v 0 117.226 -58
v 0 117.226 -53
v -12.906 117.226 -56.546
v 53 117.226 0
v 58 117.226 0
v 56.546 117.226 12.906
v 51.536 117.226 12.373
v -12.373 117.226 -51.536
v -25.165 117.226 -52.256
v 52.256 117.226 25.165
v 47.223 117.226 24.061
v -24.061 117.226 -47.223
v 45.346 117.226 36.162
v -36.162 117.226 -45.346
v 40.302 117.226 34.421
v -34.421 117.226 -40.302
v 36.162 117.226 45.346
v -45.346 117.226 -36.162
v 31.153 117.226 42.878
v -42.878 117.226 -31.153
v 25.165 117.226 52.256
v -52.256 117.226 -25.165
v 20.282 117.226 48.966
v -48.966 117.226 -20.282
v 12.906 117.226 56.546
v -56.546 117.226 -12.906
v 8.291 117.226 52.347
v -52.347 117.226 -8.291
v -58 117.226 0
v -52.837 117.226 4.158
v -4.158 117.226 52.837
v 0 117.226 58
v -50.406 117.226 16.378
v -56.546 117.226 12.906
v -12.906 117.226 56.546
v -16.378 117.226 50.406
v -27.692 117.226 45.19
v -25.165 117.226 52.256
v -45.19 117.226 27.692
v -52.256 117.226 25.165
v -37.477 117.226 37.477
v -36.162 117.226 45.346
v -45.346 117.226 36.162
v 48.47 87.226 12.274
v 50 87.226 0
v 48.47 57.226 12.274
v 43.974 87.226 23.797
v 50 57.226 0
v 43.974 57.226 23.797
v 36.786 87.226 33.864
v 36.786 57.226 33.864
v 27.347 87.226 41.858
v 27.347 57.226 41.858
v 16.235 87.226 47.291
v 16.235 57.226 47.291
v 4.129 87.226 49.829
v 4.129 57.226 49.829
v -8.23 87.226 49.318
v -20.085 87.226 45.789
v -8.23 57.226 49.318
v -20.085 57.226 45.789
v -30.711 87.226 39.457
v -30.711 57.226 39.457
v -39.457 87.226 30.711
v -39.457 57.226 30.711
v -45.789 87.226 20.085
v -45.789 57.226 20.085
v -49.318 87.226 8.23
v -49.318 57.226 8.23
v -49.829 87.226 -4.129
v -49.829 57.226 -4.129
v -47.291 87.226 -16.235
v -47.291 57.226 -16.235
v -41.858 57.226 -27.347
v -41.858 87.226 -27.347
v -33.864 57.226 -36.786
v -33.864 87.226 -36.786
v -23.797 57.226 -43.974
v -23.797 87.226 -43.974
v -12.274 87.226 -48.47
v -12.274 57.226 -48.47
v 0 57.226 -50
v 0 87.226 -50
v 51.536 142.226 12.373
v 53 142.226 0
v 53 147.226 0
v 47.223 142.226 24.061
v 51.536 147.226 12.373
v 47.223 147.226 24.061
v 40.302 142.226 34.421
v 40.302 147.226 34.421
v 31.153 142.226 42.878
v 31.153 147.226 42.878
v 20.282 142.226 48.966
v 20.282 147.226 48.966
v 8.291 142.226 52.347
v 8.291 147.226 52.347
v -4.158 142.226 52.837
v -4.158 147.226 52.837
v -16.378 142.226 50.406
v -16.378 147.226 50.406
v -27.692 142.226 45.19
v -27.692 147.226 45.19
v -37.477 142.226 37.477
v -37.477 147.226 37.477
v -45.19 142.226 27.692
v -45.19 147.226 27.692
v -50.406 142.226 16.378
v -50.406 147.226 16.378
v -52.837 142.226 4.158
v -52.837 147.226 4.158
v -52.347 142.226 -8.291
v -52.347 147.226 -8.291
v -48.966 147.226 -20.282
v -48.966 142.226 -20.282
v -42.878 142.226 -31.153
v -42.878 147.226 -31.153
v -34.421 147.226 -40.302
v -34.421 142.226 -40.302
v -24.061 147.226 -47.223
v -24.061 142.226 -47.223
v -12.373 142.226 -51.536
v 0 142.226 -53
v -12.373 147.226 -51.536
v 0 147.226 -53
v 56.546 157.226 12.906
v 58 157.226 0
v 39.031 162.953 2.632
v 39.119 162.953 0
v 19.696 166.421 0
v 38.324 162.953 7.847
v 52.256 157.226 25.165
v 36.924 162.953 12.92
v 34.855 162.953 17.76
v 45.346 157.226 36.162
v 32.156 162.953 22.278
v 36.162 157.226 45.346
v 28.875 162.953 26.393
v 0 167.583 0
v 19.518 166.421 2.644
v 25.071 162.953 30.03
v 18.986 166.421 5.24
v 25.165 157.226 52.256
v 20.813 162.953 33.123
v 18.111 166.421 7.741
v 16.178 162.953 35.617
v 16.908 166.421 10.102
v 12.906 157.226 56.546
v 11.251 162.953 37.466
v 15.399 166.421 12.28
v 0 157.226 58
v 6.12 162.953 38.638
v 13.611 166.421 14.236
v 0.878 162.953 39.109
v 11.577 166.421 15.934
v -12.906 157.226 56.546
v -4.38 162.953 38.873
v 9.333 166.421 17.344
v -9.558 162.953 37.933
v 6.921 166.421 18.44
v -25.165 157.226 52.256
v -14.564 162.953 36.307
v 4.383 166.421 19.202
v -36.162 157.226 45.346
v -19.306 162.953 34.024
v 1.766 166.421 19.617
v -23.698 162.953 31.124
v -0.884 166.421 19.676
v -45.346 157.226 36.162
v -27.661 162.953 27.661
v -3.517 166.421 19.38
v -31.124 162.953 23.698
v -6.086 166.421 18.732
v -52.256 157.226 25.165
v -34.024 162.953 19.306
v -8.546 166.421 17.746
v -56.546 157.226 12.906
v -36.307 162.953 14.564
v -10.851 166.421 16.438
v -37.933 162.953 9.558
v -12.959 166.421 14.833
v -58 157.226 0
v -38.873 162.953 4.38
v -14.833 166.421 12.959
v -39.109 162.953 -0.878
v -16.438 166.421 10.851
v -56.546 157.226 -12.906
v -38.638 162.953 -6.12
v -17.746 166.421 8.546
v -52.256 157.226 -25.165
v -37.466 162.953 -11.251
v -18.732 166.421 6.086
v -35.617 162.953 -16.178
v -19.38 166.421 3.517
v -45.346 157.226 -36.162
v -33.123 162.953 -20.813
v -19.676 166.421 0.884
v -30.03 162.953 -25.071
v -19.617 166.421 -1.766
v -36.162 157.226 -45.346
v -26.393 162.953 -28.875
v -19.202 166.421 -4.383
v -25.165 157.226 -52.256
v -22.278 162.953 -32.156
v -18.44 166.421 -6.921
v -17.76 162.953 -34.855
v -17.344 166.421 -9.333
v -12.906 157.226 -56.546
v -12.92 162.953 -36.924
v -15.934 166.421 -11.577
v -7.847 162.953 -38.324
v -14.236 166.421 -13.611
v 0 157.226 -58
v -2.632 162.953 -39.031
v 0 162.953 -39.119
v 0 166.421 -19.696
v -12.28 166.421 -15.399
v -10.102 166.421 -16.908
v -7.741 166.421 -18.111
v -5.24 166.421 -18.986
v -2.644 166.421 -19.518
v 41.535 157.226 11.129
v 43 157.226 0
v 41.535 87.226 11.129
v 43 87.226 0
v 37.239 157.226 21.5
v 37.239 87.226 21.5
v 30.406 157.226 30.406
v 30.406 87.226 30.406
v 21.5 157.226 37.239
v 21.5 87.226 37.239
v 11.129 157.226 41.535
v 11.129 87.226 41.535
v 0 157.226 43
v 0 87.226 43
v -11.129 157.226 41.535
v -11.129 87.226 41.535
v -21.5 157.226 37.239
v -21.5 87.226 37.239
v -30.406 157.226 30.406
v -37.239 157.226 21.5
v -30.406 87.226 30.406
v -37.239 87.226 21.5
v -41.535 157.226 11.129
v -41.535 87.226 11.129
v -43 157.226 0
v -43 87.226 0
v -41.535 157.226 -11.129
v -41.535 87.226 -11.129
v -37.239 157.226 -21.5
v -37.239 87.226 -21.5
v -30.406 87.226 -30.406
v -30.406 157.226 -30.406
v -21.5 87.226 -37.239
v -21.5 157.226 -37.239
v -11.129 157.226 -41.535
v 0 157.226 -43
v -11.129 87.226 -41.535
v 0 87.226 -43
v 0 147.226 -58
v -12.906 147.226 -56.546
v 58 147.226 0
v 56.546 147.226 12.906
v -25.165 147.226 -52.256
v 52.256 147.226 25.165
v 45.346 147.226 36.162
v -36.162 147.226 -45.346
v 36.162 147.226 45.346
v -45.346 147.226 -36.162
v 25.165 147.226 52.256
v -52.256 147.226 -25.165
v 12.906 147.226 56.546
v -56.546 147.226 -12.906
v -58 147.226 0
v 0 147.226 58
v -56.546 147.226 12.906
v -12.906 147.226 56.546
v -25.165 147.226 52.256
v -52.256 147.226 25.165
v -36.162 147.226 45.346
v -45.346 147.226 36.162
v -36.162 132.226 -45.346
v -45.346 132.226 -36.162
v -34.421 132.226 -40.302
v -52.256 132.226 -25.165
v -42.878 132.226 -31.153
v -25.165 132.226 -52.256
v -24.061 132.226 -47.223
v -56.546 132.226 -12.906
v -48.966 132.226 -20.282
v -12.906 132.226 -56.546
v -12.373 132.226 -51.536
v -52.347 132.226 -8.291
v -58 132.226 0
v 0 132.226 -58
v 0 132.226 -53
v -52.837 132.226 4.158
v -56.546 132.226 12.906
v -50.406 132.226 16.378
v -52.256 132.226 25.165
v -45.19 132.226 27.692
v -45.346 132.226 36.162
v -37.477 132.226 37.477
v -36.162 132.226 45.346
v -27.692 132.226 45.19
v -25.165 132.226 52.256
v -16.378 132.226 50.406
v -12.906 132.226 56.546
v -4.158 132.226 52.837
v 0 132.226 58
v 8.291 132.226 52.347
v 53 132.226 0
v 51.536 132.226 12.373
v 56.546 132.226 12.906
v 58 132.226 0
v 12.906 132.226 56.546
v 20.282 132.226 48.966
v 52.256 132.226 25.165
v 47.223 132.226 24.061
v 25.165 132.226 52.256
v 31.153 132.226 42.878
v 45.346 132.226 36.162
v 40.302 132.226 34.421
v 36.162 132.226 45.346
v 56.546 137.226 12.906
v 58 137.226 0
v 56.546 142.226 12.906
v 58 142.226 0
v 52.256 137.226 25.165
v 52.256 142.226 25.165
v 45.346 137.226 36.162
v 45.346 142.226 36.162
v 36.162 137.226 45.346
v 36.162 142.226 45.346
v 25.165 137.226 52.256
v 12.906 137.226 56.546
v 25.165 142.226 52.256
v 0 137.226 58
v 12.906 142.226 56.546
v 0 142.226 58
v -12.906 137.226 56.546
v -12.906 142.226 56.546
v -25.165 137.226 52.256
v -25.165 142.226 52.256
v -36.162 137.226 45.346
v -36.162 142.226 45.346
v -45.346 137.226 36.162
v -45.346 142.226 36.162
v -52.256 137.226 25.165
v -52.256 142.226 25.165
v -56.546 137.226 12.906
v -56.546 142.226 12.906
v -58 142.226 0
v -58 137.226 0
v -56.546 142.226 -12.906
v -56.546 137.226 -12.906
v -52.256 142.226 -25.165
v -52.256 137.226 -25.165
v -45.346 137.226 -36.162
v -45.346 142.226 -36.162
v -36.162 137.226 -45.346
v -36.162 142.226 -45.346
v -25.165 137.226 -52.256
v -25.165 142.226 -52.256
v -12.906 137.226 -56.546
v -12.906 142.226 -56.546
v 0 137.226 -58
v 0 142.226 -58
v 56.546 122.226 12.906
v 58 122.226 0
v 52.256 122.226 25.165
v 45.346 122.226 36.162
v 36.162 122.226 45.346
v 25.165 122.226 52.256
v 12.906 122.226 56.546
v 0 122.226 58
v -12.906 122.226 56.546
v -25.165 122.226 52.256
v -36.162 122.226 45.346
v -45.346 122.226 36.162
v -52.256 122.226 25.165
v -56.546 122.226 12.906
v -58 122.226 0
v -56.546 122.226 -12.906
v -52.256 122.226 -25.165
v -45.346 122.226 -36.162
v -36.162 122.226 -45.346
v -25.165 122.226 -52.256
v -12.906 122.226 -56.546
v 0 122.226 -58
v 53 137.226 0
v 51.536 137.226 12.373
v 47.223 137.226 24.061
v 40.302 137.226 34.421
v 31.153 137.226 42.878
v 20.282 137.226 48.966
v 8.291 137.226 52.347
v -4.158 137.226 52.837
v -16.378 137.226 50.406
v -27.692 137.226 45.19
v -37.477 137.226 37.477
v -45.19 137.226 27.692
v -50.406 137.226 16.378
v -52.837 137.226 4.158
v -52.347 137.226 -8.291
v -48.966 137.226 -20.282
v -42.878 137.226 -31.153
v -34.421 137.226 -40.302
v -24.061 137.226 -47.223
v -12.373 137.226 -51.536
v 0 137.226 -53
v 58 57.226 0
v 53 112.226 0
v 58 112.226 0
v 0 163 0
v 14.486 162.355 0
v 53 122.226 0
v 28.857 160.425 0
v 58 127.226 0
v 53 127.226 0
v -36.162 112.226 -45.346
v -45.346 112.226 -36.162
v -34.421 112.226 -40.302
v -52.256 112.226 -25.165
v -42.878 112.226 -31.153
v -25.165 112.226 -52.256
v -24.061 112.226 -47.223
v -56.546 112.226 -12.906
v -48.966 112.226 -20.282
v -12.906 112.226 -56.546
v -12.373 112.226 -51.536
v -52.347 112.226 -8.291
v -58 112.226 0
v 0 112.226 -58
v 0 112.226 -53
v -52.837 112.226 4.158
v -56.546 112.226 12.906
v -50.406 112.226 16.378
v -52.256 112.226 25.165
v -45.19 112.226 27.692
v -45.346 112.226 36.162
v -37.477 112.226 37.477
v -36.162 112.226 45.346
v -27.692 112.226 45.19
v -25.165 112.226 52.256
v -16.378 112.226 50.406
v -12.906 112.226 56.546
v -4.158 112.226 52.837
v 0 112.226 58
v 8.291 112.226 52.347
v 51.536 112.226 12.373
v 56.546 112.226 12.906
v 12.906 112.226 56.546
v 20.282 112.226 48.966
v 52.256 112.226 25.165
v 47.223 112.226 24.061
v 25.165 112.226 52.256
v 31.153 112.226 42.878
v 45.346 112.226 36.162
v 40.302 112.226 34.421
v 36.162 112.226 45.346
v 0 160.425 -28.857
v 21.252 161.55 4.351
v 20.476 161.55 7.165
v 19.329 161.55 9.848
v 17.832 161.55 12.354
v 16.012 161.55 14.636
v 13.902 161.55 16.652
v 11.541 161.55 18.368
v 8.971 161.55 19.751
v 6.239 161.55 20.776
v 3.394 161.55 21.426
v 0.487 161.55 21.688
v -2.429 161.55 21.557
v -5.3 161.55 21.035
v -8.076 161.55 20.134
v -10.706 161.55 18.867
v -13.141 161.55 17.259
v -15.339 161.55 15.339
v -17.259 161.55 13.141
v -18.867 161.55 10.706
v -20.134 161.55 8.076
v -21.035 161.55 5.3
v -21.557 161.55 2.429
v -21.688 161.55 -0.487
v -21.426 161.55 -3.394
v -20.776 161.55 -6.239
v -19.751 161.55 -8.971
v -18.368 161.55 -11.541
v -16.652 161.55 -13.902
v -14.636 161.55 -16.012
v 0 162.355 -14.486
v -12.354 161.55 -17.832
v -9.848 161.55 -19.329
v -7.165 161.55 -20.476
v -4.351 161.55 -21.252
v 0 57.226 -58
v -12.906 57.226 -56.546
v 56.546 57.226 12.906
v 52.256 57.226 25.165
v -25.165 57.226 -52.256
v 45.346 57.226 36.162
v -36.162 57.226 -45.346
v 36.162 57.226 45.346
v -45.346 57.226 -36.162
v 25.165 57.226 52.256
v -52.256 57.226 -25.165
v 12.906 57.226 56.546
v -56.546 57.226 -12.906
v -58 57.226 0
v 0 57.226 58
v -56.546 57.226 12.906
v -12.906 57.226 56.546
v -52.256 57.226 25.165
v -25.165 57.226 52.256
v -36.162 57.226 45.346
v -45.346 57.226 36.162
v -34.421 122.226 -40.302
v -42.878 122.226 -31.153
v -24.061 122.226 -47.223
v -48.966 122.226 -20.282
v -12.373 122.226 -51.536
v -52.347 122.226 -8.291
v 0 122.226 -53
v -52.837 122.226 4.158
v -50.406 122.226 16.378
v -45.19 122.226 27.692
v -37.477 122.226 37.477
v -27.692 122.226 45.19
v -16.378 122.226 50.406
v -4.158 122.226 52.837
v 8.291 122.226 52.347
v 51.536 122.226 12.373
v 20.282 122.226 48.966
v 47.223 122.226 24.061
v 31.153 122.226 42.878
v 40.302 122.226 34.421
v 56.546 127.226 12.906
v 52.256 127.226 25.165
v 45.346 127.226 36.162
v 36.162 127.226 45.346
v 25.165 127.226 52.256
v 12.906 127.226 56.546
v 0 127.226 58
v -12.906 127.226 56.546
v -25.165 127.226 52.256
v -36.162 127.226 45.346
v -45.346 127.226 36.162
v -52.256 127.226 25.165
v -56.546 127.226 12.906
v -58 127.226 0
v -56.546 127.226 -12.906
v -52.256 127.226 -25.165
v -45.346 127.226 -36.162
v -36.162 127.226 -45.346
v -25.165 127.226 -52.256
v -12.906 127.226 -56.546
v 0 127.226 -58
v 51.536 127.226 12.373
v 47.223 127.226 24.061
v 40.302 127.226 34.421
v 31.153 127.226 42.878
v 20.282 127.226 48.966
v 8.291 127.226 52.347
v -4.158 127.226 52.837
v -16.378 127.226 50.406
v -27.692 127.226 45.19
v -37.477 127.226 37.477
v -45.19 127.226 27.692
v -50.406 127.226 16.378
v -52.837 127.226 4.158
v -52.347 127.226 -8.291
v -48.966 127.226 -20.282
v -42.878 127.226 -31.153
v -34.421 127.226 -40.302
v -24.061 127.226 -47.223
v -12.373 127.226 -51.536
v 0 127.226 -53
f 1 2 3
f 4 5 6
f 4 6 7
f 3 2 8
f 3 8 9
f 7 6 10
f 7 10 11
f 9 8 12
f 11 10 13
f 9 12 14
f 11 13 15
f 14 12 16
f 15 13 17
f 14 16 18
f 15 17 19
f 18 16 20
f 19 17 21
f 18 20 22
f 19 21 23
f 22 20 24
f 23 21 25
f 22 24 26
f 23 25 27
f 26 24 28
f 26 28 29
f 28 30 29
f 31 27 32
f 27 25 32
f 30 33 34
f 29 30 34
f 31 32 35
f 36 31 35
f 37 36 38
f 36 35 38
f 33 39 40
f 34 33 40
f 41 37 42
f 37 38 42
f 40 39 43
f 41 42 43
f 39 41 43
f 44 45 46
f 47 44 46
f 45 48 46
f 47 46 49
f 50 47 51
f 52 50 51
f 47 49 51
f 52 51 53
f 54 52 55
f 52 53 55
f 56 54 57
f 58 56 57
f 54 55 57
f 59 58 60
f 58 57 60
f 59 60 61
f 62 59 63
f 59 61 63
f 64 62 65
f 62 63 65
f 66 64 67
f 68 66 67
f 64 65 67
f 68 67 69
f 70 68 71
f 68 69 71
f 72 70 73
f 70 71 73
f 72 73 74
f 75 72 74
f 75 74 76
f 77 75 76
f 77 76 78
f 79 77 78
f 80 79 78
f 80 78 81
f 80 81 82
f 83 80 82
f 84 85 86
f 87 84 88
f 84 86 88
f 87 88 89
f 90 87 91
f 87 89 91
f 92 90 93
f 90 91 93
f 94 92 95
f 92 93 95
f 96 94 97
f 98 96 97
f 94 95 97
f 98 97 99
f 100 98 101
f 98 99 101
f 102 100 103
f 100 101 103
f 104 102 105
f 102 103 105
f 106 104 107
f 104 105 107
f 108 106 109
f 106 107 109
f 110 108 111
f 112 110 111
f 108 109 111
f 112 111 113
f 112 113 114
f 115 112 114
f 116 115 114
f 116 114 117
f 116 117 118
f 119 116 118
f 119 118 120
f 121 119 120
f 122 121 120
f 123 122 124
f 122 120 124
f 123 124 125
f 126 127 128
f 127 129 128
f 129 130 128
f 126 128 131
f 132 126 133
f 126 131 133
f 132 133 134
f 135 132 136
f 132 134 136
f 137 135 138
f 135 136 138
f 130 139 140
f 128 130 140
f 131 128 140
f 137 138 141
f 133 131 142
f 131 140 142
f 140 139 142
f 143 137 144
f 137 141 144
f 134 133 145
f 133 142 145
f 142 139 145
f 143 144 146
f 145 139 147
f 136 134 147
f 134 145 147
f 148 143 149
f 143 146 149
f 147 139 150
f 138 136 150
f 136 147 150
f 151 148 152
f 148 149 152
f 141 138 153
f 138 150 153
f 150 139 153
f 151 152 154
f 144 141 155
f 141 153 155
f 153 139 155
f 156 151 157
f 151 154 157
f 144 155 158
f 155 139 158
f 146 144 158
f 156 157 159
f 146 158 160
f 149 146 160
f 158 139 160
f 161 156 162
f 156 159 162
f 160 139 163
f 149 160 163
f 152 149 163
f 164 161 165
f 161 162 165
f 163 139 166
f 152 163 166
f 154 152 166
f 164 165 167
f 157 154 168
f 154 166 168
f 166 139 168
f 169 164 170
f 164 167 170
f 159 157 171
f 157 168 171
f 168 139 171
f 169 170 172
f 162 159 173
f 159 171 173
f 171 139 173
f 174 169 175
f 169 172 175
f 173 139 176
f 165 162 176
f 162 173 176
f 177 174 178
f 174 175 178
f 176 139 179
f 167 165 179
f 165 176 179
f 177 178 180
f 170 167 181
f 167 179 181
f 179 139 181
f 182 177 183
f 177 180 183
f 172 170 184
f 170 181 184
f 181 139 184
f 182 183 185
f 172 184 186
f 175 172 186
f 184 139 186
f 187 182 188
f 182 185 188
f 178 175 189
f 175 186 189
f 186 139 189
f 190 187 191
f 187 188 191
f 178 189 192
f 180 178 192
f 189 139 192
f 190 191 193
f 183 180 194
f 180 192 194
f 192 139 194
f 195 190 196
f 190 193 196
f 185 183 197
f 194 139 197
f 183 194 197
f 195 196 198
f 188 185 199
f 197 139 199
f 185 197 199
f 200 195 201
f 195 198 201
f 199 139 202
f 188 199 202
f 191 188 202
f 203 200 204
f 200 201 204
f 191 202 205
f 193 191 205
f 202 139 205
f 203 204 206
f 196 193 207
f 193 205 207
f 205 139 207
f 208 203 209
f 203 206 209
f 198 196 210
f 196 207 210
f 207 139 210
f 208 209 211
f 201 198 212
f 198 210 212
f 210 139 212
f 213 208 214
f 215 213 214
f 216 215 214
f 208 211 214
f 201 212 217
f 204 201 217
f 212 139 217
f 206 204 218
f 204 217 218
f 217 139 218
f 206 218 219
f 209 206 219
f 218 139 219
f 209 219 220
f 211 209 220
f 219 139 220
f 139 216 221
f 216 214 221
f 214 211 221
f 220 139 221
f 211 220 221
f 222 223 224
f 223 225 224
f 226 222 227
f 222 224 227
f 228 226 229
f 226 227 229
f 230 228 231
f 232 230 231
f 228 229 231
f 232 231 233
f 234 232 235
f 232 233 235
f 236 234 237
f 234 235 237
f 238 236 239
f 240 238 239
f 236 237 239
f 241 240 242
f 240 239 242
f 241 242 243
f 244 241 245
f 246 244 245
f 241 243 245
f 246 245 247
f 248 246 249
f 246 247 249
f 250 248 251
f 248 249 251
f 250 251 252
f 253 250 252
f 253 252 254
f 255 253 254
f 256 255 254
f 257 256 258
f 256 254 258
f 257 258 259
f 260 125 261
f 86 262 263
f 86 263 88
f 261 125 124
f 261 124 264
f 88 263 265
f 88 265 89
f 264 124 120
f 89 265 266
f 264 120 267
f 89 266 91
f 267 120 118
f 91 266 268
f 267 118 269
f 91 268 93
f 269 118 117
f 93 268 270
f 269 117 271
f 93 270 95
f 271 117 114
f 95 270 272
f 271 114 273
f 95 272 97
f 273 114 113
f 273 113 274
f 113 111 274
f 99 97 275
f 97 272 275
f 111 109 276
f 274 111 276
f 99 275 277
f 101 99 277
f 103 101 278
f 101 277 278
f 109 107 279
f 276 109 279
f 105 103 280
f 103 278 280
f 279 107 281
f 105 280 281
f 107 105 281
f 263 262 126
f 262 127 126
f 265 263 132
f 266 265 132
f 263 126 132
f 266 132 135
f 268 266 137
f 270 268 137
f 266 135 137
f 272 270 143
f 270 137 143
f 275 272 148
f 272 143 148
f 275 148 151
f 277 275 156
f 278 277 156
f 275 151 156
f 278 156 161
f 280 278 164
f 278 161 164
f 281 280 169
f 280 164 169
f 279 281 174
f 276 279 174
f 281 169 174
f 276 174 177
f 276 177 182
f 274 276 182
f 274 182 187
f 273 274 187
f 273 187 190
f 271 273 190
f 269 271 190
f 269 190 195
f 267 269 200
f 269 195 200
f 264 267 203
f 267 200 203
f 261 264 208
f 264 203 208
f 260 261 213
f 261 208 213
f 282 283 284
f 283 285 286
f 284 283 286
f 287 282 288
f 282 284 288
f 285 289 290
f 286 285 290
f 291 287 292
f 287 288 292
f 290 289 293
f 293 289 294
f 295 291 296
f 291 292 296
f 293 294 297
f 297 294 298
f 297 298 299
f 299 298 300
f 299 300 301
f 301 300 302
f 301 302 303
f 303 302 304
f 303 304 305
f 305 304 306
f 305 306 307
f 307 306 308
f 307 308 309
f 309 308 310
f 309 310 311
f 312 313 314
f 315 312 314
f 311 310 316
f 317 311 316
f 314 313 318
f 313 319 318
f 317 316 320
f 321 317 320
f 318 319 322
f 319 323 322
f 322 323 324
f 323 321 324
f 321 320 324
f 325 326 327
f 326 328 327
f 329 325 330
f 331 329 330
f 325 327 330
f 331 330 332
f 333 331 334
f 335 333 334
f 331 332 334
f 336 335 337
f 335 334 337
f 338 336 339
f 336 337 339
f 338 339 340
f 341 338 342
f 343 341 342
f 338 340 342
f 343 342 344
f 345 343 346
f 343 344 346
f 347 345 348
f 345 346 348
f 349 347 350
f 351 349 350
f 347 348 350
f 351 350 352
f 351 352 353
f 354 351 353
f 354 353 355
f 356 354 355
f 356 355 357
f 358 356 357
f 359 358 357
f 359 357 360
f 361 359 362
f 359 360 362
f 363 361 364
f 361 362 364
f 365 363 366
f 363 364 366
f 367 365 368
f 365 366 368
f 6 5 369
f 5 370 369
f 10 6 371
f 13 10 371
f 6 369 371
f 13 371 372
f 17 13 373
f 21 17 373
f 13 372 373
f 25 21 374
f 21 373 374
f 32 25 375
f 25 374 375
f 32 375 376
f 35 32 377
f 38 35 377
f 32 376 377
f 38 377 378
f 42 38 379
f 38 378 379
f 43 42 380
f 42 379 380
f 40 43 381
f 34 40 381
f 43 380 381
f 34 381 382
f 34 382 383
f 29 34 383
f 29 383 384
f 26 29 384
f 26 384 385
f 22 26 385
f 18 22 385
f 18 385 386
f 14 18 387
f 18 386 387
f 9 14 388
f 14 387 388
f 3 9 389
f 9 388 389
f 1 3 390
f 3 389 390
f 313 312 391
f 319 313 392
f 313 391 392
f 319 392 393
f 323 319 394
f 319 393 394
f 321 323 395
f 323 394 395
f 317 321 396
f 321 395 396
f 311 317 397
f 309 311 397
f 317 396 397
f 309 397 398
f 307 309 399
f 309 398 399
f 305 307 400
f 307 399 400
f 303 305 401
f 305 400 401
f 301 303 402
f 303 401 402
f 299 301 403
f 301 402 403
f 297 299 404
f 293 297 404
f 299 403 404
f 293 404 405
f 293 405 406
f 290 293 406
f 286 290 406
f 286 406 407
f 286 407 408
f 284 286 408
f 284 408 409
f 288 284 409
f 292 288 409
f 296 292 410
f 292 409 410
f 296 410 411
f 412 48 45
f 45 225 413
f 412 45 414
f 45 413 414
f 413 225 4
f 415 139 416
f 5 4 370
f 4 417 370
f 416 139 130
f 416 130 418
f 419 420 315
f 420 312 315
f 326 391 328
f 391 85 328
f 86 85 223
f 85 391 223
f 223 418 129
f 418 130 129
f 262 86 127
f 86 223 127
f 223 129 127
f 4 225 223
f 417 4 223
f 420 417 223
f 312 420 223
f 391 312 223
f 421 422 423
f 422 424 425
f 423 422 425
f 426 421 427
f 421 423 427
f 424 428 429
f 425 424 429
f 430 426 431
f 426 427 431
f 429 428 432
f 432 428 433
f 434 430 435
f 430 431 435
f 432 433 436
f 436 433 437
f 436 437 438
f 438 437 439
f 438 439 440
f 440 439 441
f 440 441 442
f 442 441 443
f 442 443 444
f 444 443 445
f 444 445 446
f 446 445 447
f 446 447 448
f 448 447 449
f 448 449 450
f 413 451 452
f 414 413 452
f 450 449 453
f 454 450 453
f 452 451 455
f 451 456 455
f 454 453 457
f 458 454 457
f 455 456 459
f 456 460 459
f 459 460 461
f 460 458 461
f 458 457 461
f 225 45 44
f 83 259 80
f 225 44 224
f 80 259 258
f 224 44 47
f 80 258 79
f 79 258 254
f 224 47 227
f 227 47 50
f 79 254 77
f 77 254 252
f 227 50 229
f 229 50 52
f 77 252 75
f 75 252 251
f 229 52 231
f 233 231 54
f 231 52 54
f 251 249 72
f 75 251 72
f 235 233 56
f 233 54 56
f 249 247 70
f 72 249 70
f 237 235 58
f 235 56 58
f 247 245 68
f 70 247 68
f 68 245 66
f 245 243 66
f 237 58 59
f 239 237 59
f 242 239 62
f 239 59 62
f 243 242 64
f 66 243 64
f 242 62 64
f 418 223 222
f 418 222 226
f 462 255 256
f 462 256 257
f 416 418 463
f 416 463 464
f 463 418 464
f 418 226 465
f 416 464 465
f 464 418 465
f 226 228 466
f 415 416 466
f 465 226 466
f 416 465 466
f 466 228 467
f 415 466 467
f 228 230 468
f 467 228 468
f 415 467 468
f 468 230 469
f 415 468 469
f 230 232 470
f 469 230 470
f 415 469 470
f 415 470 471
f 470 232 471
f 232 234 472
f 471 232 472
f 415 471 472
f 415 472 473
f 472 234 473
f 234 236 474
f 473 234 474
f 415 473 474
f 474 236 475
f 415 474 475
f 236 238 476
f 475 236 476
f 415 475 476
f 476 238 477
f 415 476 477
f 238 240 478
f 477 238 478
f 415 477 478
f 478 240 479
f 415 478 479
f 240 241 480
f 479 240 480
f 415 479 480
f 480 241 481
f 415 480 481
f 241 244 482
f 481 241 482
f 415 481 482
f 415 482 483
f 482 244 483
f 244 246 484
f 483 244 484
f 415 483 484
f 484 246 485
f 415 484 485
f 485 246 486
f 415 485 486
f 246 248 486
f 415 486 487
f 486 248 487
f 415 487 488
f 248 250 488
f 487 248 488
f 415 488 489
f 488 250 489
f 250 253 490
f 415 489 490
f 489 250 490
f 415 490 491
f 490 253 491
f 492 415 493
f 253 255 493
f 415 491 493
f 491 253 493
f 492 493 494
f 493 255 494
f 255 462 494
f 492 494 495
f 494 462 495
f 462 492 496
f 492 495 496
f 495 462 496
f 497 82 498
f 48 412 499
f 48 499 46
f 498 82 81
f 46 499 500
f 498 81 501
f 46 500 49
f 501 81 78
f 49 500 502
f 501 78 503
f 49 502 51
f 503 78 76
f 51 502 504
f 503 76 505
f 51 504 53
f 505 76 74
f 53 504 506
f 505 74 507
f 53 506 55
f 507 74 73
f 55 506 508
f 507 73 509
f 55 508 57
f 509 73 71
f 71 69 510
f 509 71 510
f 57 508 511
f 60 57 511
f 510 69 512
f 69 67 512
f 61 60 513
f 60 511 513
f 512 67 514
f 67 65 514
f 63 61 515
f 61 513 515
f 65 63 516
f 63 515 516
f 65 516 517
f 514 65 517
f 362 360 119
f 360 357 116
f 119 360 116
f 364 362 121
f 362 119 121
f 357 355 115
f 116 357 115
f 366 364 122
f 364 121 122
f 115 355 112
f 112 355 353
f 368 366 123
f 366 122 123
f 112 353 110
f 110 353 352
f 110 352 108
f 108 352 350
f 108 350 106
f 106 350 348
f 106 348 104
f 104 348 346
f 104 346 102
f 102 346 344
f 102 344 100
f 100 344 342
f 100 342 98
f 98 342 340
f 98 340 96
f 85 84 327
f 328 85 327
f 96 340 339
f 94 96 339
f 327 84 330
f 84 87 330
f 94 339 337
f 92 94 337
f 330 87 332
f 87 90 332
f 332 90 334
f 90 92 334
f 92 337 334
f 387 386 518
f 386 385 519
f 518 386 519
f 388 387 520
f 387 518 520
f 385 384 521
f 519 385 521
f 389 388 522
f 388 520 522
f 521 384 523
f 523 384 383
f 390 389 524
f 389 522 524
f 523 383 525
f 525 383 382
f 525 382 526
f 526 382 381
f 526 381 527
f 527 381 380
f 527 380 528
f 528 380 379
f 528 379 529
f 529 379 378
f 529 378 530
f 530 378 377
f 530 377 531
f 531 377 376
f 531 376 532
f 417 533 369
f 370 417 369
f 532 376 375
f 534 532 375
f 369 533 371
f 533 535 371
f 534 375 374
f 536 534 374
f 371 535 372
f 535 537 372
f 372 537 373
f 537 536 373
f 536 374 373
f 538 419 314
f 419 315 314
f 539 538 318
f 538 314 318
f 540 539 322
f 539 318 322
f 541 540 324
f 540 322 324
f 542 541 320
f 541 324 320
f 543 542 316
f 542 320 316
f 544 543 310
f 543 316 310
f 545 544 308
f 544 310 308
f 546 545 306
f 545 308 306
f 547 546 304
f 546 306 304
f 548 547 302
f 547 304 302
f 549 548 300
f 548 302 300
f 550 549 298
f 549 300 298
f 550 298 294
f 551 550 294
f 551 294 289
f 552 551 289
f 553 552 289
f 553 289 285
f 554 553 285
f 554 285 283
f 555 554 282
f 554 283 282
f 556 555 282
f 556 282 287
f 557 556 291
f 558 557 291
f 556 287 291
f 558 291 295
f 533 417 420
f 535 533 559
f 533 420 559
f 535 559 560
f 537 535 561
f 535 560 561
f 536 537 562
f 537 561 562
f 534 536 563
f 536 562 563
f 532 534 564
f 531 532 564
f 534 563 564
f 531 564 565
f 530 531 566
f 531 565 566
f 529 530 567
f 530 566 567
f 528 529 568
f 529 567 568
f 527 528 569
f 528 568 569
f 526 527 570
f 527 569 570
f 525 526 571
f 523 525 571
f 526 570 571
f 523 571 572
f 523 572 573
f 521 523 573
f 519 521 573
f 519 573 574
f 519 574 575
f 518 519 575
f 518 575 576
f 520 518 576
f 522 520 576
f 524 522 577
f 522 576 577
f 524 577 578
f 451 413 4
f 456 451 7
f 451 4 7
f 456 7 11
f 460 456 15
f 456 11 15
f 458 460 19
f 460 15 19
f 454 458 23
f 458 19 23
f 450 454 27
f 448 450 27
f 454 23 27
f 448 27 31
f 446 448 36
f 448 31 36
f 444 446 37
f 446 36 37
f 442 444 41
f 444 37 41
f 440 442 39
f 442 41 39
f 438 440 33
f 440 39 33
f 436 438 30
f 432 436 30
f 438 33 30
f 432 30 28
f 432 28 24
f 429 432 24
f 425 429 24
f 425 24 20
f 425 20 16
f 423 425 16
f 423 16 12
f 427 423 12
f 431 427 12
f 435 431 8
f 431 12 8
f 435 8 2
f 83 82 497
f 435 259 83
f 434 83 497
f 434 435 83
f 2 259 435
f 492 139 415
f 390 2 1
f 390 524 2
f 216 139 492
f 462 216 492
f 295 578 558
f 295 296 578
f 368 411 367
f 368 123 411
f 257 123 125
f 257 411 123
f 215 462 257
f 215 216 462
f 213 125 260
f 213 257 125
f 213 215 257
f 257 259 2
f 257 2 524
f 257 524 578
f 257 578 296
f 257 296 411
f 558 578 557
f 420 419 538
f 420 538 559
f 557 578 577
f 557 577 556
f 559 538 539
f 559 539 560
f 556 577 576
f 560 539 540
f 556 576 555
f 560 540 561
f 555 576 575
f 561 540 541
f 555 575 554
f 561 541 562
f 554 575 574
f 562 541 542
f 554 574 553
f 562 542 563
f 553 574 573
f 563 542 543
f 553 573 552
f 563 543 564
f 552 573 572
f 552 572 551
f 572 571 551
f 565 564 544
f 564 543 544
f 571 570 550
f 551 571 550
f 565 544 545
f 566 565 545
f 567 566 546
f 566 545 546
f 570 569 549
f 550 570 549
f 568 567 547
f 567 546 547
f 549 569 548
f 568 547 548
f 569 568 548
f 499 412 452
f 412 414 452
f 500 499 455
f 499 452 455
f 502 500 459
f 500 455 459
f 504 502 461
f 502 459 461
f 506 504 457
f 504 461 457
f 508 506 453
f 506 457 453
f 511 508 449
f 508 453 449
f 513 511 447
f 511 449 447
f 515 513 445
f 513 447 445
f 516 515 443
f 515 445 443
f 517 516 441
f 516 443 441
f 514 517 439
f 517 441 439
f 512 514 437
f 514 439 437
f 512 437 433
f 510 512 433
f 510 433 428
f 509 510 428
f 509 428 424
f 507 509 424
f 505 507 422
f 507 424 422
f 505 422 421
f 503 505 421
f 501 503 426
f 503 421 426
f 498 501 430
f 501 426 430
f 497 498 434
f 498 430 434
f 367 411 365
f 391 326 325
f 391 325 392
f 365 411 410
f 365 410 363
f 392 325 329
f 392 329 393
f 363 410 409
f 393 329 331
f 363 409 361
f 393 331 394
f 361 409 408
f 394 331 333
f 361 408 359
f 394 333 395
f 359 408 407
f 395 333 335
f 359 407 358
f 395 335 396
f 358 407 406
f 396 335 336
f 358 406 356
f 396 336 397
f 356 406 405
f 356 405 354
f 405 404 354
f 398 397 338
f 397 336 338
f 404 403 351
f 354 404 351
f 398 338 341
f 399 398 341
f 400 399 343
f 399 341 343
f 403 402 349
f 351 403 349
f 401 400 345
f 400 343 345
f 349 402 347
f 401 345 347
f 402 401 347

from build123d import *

# Parameters (mm, degrees)
REVOLVE1_ANGLE = 270


with BuildPart() as part:
    # Sketch1 → Revolve1 (revolve)
    with BuildSketch(Plane.XY):
        with BuildLine():
            Line((0, 167.582815348), (0, 163))
            ThreePointArc((0, 163), (21.692969078, 161.550038974), (43, 157.225952056))
            Line((43, 157.225952056), (43, 87.225952056))
            Line((43, 87.225952056), (50, 87.225952056))
            Line((50, 87.225952056), (50, 57.225952056))
            Line((50, 57.225952056), (58, 57.225952056))
            Line((58, 57.225952056), (58, 112.225952056))
            Line((58, 112.225952056), (53, 112.225952056))
            Line((53, 112.225952056), (53, 117.225952056))
            Line((53, 117.225952056), (58, 117.225952056))
            Line((58, 117.225952056), (58, 122.225952056))
            Line((58, 122.225952056), (53, 122.225952056))
            Line((53, 122.225952056), (53, 127.225952056))
            Line((53, 127.225952056), (58, 127.225952056))
            Line((58, 127.225952056), (58, 132.225952056))
            Line((58, 132.225952056), (53, 132.225952056))
            Line((53, 132.225952056), (53, 137.225952056))
            Line((53, 137.225952056), (58, 137.225952056))
            Line((58, 137.225952056), (58, 142.225952056))
            Line((58, 142.225952056), (53, 142.225952056))
            Line((53, 142.225952056), (53, 147.225952056))
            Line((53, 147.225952056), (58, 147.225952056))
            Line((58, 147.225952056), (58, 157.225952056))
            ThreePointArc((58, 157.225952056), (29.458719495, 164.973282218), (0, 167.582815348))
        make_face()
    revolve(axis=Axis((0, 598.051491246, 0), (0, -1, 0)), revolution_arc=REVOLVE1_ANGLE)


solid = part.part
